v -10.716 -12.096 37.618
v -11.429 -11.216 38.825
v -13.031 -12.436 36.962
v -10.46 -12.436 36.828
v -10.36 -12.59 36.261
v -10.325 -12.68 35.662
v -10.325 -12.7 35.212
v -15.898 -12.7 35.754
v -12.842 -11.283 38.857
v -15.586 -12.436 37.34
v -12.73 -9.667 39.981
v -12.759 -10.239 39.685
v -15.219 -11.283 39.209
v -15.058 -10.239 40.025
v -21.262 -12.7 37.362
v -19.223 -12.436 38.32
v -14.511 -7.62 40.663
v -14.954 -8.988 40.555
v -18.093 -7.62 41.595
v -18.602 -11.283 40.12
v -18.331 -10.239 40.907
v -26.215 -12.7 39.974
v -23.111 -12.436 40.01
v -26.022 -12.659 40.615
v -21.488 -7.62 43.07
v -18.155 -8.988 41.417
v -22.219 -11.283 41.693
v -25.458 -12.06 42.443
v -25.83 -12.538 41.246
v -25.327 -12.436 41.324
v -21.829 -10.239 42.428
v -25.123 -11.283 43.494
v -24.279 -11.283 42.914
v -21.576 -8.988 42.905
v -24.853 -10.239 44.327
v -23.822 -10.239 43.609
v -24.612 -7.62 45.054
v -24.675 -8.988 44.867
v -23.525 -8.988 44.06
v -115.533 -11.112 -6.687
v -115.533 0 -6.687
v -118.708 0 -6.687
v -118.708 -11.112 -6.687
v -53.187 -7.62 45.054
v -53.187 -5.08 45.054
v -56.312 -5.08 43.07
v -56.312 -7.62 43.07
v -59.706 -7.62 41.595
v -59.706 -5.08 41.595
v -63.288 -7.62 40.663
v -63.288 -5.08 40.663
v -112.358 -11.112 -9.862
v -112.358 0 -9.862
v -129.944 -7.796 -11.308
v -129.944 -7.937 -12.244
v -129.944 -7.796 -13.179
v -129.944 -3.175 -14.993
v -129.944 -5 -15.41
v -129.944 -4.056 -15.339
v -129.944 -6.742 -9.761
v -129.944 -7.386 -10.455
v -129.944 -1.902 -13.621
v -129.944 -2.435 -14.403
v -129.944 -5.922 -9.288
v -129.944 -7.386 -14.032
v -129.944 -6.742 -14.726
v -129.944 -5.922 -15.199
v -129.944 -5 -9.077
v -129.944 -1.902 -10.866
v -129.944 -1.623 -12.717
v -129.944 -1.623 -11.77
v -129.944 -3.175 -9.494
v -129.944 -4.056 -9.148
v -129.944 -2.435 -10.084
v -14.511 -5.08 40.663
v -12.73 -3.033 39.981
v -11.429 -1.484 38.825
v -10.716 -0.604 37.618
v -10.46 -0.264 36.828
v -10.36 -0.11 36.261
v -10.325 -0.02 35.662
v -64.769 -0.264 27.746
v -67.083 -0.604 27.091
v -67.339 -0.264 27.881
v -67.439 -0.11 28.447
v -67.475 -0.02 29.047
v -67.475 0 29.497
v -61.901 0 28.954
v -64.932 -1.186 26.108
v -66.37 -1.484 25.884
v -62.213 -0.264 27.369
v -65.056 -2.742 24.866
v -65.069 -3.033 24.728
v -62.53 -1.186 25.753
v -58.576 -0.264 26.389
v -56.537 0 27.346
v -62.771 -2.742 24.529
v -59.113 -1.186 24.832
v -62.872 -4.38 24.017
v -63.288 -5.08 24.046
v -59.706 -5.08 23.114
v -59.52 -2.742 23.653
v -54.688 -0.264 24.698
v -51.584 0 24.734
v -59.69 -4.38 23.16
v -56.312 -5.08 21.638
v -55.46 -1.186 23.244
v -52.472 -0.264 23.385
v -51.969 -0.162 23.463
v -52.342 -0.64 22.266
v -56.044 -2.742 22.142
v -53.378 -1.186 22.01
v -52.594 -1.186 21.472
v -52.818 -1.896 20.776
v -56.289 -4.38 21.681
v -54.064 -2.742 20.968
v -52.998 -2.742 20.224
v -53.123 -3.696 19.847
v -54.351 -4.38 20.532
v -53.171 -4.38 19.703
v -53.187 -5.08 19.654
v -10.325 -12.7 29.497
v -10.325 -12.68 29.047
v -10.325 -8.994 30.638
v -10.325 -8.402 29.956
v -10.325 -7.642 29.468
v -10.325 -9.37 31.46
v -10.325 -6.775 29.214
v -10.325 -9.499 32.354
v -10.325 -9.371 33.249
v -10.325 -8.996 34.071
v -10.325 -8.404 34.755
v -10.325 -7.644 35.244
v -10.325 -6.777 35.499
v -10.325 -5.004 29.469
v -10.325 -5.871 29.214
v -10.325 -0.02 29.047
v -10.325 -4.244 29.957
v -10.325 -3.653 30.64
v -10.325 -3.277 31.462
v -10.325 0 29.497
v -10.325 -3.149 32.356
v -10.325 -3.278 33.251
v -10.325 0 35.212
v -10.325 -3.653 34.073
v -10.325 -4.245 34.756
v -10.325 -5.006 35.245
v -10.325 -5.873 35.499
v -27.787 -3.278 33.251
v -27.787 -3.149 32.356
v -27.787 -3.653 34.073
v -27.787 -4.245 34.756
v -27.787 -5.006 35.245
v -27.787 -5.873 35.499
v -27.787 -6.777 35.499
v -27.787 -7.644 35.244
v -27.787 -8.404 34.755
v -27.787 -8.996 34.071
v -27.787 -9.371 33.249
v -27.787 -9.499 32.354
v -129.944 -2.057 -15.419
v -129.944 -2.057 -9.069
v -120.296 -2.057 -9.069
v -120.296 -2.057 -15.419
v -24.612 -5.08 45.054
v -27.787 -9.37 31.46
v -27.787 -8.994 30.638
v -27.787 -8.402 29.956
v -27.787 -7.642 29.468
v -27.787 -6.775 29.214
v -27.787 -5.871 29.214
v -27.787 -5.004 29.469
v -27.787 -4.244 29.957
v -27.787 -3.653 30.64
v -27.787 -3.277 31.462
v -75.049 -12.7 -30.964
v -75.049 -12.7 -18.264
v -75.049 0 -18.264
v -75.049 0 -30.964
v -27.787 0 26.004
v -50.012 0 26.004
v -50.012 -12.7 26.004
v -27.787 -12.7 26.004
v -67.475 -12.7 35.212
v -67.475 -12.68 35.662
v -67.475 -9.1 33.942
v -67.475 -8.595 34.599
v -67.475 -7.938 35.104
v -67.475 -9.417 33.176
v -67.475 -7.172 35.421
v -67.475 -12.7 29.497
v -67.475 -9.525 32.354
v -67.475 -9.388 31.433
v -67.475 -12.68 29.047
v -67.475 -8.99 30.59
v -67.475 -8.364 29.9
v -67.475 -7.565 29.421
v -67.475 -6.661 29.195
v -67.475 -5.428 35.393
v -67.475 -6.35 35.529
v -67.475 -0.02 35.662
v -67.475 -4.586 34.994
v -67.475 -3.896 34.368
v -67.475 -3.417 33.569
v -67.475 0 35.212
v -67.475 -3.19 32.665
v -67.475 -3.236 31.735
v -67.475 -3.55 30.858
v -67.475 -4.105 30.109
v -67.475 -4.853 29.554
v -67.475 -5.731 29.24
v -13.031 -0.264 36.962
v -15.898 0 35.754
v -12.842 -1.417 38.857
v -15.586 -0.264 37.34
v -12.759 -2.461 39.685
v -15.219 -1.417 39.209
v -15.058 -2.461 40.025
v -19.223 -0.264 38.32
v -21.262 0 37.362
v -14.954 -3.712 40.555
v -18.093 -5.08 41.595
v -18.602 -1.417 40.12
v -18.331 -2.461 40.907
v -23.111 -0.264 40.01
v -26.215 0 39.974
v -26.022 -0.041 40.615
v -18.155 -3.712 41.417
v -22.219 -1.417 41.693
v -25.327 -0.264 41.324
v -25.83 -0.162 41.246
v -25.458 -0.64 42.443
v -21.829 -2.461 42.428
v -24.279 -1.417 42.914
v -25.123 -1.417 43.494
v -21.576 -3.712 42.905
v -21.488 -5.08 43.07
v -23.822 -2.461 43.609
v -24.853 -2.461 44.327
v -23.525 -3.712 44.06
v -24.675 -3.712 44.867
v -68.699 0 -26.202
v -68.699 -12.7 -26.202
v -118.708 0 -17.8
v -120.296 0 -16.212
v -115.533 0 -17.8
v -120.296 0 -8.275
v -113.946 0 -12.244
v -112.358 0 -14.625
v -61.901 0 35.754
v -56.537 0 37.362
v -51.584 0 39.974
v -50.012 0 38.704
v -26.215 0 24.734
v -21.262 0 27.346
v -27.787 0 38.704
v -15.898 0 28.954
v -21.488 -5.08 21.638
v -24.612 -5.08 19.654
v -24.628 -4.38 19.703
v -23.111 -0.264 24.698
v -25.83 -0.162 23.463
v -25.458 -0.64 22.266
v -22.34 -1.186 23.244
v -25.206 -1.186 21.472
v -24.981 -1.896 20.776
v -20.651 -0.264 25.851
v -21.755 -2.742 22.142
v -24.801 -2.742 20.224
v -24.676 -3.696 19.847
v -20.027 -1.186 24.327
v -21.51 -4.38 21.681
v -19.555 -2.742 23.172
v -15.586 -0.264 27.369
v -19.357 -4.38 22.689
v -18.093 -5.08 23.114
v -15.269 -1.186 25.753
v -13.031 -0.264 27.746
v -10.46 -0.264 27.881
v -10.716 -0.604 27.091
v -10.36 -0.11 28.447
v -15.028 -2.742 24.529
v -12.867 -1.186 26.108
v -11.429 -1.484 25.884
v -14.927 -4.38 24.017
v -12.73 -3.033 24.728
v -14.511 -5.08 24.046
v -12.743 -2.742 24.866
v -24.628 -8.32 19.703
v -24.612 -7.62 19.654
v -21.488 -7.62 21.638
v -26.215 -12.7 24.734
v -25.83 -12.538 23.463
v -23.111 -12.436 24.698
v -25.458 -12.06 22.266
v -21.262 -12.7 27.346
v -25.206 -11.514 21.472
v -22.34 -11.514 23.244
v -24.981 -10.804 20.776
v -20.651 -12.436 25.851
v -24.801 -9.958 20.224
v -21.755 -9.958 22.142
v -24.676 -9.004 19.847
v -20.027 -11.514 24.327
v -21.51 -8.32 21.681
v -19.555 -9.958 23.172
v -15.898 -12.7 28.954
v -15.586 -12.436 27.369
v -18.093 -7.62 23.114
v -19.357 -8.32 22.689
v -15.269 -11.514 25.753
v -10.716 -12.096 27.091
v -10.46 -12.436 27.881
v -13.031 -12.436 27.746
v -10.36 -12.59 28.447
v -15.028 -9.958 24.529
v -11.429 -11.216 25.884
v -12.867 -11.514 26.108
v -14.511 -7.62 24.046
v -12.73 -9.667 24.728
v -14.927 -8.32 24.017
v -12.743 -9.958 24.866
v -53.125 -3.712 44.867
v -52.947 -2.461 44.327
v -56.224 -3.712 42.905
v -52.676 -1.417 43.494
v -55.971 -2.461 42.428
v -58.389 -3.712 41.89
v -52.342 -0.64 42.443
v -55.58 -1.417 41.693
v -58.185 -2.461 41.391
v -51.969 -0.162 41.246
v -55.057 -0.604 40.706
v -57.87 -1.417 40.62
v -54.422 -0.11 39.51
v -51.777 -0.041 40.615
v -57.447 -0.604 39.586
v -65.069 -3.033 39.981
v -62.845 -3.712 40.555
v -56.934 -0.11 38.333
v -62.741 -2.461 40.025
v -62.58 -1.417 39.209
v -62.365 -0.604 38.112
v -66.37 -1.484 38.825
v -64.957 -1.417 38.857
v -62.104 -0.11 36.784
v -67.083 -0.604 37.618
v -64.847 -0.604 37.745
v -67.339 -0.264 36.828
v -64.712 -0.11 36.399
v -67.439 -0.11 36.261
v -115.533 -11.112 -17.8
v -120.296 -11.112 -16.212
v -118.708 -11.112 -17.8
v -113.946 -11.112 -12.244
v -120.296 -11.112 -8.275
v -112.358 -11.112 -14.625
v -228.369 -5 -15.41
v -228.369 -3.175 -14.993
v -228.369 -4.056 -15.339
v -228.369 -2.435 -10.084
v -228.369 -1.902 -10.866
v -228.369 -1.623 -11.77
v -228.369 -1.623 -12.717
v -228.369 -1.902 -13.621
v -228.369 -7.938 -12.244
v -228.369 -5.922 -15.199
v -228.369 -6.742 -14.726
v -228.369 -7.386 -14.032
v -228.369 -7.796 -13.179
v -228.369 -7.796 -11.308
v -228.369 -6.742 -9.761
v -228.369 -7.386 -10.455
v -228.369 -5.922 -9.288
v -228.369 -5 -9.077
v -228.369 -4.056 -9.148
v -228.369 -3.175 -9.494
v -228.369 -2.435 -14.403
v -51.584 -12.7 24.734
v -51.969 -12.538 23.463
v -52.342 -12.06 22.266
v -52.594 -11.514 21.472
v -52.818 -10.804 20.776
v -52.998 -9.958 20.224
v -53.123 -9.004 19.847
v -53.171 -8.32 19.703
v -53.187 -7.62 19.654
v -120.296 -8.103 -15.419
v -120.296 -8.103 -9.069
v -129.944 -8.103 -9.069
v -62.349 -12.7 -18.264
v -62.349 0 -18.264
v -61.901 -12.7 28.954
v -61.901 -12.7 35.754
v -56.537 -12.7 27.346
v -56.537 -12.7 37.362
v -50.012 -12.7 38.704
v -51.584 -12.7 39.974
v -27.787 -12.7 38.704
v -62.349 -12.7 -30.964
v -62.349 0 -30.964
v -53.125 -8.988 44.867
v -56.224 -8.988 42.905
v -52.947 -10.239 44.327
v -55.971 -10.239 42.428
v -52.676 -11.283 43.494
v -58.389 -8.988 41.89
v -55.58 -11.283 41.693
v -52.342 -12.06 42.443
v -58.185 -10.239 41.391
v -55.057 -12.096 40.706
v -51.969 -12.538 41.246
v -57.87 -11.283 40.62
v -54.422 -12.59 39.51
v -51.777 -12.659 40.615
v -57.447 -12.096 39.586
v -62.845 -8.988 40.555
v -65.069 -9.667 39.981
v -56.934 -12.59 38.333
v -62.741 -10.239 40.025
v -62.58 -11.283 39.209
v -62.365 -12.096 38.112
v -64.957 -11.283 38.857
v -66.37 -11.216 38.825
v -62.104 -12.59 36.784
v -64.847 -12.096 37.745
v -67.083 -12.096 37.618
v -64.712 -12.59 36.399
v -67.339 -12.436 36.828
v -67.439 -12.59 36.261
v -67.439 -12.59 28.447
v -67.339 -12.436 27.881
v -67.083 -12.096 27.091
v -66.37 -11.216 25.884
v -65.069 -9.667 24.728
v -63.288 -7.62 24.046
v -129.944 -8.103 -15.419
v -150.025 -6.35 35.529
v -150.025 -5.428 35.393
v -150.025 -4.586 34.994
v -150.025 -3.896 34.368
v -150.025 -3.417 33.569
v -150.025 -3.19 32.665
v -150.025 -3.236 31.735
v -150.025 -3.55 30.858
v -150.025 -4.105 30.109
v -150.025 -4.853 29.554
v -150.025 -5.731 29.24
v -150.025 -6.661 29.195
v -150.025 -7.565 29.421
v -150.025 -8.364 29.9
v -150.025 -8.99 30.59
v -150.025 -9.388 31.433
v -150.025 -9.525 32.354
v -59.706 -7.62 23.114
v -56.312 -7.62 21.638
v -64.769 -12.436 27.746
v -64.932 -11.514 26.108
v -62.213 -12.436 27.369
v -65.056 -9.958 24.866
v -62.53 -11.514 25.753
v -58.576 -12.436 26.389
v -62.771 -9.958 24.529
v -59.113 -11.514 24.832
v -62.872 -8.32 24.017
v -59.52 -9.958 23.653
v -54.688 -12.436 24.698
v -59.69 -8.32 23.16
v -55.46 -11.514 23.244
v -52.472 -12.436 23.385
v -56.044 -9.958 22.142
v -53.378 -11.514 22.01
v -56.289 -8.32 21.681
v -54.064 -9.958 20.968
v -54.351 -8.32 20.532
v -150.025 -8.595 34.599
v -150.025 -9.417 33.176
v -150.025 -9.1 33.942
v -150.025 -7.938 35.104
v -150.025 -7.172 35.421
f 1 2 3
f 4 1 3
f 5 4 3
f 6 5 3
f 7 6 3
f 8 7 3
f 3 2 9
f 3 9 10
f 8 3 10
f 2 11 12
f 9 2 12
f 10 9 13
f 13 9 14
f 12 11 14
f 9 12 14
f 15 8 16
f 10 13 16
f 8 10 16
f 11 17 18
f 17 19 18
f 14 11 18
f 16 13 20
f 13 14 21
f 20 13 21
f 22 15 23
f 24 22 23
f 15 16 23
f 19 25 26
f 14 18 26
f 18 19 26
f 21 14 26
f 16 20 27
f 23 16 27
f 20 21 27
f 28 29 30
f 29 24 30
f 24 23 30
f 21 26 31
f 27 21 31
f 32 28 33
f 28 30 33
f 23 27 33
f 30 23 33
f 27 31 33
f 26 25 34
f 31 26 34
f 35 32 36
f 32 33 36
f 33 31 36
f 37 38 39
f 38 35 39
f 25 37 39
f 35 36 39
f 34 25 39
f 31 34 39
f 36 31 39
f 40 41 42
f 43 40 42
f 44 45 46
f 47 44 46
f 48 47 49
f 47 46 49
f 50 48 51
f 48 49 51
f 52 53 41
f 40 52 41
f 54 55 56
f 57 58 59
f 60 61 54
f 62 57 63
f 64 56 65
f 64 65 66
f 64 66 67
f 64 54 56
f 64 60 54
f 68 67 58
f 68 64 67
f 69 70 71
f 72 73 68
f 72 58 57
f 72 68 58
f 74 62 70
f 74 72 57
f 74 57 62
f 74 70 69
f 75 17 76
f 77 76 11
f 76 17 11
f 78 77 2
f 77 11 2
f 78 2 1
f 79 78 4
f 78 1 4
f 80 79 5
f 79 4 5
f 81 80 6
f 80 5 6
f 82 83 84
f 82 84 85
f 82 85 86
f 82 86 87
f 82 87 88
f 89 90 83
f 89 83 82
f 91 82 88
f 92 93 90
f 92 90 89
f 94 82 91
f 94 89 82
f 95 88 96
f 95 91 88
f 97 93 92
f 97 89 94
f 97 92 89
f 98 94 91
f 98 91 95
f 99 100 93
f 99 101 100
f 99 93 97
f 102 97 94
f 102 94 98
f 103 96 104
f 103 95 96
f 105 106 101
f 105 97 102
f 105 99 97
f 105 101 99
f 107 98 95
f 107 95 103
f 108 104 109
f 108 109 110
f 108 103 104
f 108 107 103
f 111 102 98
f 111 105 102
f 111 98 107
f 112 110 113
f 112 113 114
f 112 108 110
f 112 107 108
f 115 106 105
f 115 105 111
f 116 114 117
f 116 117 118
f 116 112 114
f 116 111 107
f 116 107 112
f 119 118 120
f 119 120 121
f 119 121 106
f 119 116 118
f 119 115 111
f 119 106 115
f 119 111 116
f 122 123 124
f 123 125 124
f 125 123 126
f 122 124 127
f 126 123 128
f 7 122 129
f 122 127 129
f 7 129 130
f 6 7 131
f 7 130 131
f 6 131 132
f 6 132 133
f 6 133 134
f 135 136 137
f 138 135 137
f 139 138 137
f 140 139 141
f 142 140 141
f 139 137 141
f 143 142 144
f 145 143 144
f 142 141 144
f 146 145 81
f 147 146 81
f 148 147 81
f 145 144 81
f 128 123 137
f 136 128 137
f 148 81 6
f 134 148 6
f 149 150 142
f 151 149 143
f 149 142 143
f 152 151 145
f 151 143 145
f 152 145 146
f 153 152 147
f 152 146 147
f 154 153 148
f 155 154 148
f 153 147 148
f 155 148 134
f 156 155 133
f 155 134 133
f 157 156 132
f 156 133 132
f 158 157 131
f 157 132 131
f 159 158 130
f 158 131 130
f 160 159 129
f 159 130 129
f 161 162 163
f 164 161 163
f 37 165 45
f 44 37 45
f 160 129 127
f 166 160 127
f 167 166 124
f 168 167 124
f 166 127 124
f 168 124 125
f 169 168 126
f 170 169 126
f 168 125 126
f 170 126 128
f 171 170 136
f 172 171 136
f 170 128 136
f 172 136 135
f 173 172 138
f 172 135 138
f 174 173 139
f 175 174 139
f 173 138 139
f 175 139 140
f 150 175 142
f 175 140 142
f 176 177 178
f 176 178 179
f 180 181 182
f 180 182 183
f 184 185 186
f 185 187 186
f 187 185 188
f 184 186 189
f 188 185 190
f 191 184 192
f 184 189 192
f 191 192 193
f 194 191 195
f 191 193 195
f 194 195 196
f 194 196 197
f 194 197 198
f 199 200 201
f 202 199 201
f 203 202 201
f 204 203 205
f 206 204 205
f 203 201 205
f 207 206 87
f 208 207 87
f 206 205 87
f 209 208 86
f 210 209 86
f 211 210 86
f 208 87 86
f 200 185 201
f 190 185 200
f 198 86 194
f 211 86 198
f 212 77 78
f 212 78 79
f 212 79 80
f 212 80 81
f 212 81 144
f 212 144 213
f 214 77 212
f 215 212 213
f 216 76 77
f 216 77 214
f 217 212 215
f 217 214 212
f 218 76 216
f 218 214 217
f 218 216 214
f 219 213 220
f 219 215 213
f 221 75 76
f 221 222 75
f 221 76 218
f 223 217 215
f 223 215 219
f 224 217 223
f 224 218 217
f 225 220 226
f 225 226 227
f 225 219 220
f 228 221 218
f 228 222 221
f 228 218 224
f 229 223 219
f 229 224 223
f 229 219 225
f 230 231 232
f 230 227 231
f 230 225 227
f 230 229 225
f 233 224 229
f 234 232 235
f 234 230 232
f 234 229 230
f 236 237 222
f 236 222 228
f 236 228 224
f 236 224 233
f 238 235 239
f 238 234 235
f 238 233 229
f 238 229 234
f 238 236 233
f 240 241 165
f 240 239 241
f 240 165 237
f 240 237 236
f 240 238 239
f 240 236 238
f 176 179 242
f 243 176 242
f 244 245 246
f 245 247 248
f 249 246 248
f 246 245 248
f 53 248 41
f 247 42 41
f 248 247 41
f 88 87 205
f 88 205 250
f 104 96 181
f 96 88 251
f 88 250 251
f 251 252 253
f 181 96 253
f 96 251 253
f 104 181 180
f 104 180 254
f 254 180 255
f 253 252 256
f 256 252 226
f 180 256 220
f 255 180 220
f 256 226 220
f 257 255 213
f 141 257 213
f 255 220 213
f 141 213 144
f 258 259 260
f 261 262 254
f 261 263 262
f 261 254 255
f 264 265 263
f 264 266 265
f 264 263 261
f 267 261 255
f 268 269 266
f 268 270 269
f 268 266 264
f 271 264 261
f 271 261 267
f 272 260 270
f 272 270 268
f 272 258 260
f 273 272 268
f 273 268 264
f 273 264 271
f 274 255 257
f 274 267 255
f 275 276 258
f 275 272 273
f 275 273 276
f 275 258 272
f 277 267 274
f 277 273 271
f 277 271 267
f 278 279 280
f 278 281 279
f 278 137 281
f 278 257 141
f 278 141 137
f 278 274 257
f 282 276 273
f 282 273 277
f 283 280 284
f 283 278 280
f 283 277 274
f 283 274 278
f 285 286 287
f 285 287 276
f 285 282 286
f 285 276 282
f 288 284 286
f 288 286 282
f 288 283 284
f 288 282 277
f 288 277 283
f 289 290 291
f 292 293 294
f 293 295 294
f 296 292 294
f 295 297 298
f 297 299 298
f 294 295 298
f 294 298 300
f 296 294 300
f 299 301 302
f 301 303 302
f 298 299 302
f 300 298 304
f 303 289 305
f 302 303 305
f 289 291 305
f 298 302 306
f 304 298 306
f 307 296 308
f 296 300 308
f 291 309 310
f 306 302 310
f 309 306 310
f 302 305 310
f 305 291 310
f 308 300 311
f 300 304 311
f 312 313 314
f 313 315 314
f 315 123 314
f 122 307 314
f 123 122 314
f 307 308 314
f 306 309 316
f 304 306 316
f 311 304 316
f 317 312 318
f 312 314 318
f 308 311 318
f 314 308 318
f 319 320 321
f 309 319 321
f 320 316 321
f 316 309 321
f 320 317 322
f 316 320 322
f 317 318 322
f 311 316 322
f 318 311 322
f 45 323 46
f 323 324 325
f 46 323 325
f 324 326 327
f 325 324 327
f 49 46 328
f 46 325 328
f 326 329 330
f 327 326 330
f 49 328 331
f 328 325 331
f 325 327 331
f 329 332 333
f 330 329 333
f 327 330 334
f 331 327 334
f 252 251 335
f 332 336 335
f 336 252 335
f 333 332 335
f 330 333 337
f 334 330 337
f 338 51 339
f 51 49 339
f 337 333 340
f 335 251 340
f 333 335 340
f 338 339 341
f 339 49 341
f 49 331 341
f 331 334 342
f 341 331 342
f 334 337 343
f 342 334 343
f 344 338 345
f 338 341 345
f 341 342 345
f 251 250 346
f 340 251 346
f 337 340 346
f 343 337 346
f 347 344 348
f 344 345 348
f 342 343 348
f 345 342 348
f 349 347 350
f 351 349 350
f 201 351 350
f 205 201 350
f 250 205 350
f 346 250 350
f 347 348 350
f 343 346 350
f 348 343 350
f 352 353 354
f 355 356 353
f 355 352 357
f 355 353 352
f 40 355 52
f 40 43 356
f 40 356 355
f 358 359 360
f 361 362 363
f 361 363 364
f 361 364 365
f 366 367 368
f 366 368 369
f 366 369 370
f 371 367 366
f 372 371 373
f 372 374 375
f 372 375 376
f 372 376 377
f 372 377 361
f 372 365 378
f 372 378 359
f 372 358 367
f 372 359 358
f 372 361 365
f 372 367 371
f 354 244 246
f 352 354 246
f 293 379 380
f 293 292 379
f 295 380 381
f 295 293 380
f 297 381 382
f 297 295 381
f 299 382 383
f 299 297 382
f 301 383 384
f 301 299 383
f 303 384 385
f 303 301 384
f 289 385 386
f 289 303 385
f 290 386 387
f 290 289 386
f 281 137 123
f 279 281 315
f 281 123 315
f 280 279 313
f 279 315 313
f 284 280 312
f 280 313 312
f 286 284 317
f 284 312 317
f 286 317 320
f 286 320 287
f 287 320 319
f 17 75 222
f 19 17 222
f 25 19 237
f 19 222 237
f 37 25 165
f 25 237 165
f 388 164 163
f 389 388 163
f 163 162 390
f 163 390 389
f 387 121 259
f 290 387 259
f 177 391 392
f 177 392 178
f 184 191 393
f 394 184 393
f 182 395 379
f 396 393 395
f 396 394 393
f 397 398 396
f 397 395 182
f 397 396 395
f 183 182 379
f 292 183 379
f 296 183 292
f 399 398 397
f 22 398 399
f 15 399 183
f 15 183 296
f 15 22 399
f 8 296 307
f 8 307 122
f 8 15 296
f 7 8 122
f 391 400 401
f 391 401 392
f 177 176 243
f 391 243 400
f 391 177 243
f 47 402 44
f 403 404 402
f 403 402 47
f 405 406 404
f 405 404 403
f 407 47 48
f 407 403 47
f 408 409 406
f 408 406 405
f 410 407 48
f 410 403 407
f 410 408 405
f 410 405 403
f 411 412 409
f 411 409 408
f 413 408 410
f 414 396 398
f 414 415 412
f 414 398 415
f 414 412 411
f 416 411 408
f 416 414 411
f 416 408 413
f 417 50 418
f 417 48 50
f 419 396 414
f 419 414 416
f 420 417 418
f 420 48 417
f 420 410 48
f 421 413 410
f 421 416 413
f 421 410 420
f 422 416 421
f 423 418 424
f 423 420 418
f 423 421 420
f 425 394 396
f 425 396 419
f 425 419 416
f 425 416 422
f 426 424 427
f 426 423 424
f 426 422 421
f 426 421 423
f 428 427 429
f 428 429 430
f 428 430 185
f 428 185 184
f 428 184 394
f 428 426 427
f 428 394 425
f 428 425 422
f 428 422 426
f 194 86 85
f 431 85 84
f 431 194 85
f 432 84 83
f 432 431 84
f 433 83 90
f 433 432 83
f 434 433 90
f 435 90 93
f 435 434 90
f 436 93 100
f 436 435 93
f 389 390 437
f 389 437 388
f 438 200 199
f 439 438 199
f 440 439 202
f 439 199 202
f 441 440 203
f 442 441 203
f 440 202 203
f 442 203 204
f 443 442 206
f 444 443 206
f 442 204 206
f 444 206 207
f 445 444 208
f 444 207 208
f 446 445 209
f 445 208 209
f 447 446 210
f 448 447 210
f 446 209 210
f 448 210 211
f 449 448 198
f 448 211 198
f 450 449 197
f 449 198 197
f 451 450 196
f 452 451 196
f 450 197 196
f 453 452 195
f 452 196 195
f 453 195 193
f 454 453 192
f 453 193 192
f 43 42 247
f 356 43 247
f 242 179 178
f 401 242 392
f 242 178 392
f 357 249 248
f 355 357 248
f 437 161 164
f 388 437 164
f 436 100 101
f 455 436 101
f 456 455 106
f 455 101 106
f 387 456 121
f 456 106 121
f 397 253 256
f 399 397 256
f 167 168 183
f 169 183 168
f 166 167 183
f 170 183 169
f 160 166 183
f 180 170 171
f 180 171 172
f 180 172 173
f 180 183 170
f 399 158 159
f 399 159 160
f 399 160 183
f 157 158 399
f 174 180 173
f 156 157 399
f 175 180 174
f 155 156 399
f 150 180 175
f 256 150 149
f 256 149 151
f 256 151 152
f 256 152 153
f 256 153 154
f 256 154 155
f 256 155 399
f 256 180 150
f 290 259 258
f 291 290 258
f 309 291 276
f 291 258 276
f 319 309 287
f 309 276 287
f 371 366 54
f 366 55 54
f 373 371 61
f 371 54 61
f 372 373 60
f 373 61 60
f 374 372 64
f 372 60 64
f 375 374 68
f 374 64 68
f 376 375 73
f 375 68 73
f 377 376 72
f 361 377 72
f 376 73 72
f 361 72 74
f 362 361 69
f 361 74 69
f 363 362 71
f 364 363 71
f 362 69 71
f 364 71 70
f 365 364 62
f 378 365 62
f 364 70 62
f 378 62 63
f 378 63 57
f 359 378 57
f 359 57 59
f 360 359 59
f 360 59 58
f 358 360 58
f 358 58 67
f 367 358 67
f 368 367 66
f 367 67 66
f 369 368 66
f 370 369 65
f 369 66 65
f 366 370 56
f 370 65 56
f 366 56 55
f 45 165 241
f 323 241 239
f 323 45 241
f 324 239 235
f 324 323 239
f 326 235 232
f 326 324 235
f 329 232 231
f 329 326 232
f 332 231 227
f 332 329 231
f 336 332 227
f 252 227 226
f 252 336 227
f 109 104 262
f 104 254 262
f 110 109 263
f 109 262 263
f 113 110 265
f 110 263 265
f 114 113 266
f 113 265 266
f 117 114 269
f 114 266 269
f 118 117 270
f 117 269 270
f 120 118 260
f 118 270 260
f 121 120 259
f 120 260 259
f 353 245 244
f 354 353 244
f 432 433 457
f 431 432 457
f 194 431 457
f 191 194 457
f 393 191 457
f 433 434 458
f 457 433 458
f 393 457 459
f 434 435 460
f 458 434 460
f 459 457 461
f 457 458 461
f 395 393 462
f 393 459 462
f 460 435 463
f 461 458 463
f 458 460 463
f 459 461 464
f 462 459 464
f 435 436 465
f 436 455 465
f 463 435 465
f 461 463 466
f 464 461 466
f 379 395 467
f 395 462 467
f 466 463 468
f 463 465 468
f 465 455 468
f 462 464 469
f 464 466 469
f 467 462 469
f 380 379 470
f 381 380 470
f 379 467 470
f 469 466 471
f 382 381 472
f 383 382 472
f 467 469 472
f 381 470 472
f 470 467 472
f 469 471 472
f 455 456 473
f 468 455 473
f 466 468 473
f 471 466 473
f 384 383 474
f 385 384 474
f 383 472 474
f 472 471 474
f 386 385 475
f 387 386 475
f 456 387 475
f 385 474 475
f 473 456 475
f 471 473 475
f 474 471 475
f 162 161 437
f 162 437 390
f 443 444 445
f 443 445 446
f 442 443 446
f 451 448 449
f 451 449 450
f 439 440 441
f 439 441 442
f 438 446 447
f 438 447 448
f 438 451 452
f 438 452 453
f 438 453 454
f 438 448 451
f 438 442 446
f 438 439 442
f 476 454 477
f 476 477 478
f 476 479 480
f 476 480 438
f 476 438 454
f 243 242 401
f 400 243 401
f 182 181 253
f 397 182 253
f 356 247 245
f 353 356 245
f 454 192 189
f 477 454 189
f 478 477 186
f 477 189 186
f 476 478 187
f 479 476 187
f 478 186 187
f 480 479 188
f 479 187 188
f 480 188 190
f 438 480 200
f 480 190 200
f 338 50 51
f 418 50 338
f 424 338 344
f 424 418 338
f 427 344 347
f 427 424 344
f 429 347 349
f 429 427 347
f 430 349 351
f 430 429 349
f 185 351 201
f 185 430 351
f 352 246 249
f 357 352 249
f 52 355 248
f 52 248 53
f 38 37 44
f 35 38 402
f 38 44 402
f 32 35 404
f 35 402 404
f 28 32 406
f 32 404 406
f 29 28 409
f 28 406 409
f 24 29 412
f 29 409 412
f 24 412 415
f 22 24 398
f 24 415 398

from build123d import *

# Parameters (mm, degrees)
F2_DEPTH  = 12.7
F0_W      = 22.225
F0_H      = 12.7
F3_DEPTH  = 12.7
F4_DEPTH  = 9.525
F5_START  = 2.0574
F0_W_2    = 9.647949481
F0_H_2    = 6.35
F5_DEPTH  = 6.0452
F6_DEPTH  = 11.1125
F8_DEPTH  = 82.55
F10_DEPTH = 22.225
F11_R     = 5.08
F13_R     = 3.175
F14_DEPTH = 76.2
F17_DEPTH = 25.4


with BuildPart() as f2:
    # F1 (on Front) → F2 (new body)
    with BuildSketch(Plane.XZ):
        Polygon((-68.6993332744, -26.2016901404), (-62.3493332744, -30.9641901404), (-62.3493332744, -18.2641901404), (-75.0493332744, -18.2641901404), (-75.0493332744, -30.9641901404), align=None)
    extrude(amount=F2_DEPTH)


with BuildPart() as f3:
    # F0 (on Front) → F3 (new body)
    with BuildSketch(Plane.XZ):
        with BuildLine():
            ThreePointArc((-53.1870887518, 45.0542944759), (-59.9444150735, 41.5137734411), (-67.4745887518, 40.2917944759))
            Line((-67.4745887518, 40.2917944759), (-67.4745887518, 38.7042944759))
            Line((-67.4745887518, 38.7042944759), (-67.4745887518, 26.0042944759))
            Line((-67.4745887518, 26.0042944759), (-67.4745887518, 24.4167944759))
            ThreePointArc((-67.4745887518, 24.4167944759), (-59.9444150735, 23.1948155107), (-53.1870887518, 19.6542944759))
            Line((-53.1870887518, 19.6542944759), (-24.6120887518, 19.6542944759))
            ThreePointArc((-24.6120887518, 19.6542944759), (-17.8547624301, 23.1948155107), (-10.3245887518, 24.4167944759))
            Line((-10.3245887518, 24.4167944759), (-10.3245887518, 40.2917944759))
            ThreePointArc((-10.3245887518, 40.2917944759), (-17.8547624301, 41.5137734411), (-24.6120887518, 45.0542944759))
            Line((-24.6120887518, 45.0542944759), (-53.1870887518, 45.0542944759))
        make_face()
        with Locations((-38.8995887518, 32.3542944759)):
            Rectangle(F0_W, F0_H, mode=Mode.SUBTRACT)
    extrude(amount=F3_DEPTH)

    # F7 (on face) → F8 (join)
    with BuildSketch(Plane(origin=(-67.4745887518, 0, 0), x_dir=(0, -1, 0), z_dir=(-1, 0, 0))):
        with BuildLine():
            ThreePointArc((9.525, 32.3542944759), (8.5950640303, 34.5993585062), (6.35, 35.5292944759))
            ThreePointArc((6.35, 35.5292944759), (4.1049359697, 30.1092304456), (9.525, 32.3542944759))
        make_face()
    extrude(amount=F8_DEPTH)

    # F11
    f11_edges = [f3.edges().sort_by_distance(p)[0] for p in [
        (-59.944415, -12.7, 41.513773),
        (-59.944415, 0, 41.513773),
        (-38.899589, -12.7, 45.054294),
        (-38.899589, 0, 45.054294),
        (-17.854762, 0, 41.513773),
        (-17.854762, -12.7, 41.513773),
        (-17.854762, -12.7, 23.194816),
        (-17.854762, 0, 23.194816),
        (-38.899589, 0, 19.654294),
        (-38.899589, -12.7, 19.654294),
        (-59.944415, -12.7, 23.194816),
        (-59.944415, 0, 23.194816),
        (-67.474589, -6.35, 40.291794),
        (-67.474589, -6.35, 24.416794),
        (-10.324589, -6.35, 40.291794),
        (-10.324589, -6.35, 24.416794),
    ]]
    fillet(f11_edges, radius=F11_R)

    # F16 (on face) → F17 (cut)
    with BuildSketch(Plane.YZ.offset(-10.3245887518)):
        with BuildLine():
            ThreePointArc((-9.4988360207, 32.3542944759), (-6.3227653339, 29.1814374764), (-3.1488367438, 32.3564372957))
            ThreePointArc((-3.1488367438, 32.3564372957), (-6.3249081538, 35.5314371149), (-9.4988360207, 32.3542944759))
        make_face()
    extrude(amount=-F17_DEPTH, mode=Mode.SUBTRACT)


with BuildPart() as f4:
    # F0 (on Front) → F4 (new body)
    with BuildSketch(Plane.XZ):
        Polygon((-152.1686315536, -17.0060861856), (-152.1686315536, -7.4810861856), (-152.1686315536, -5.8935861856), (-228.3686315536, -5.8935861856), (-228.3686315536, -18.5935861856), (-152.1686315536, -18.5935861856), align=None)
    extrude(amount=F4_DEPTH)


with BuildPart() as f5:
    # F0 (on Front) → F5 (new body)
    with BuildSketch(Plane.XZ.offset(F5_START)):
        with Locations((-125.1196568131, -12.2435861856)):
            Rectangle(F0_W_2, F0_H_2)
    extrude(amount=F5_DEPTH)


with BuildPart() as f6:
    # F0 (on Front) → F6 (new body)
    with BuildSketch(Plane.XZ):
        Polygon((-120.2956820726, -8.2748361856), (-120.2956820726, -9.0685861856), (-120.2956820726, -15.4185861856), (-120.2956820726, -16.2123361856), (-118.7081820726, -17.7998361856), (-115.5331820726, -17.7998361856), (-112.3581820726, -14.6248361856), (-113.9456820726, -12.2435861856), (-112.3581820726, -9.8623361856), (-115.5331820726, -6.6873361856), (-118.7081820726, -6.6873361856), align=None)
    extrude(amount=F6_DEPTH)


with BuildPart() as f10:
    # F9 (on face) → F10 (new body)
    with BuildSketch(Plane.YZ.offset(-152.1686315536)):
        with BuildLine():
            ThreePointArc((-1.5875, -12.2435861856), (-4.7625, -9.0685861856), (-7.9375, -12.2435861856))
            ThreePointArc((-7.9375, -12.2435861856), (-4.7625, -15.4185861856), (-1.5875, -12.2435861856))
        make_face()
    extrude(amount=F10_DEPTH)

    # F13 (on face) → F14 (join)
    with BuildSketch(Plane(origin=(-152.1686315536, 0, 0), x_dir=(0, -1, 0), z_dir=(-1, 0, 0))):
        with Locations((4.7625, -12.2435861856)):
            Circle(F13_R)
    extrude(amount=F14_DEPTH)


solid = Compound([f2.part, f3.part, f5.part, f6.part, f10.part])
